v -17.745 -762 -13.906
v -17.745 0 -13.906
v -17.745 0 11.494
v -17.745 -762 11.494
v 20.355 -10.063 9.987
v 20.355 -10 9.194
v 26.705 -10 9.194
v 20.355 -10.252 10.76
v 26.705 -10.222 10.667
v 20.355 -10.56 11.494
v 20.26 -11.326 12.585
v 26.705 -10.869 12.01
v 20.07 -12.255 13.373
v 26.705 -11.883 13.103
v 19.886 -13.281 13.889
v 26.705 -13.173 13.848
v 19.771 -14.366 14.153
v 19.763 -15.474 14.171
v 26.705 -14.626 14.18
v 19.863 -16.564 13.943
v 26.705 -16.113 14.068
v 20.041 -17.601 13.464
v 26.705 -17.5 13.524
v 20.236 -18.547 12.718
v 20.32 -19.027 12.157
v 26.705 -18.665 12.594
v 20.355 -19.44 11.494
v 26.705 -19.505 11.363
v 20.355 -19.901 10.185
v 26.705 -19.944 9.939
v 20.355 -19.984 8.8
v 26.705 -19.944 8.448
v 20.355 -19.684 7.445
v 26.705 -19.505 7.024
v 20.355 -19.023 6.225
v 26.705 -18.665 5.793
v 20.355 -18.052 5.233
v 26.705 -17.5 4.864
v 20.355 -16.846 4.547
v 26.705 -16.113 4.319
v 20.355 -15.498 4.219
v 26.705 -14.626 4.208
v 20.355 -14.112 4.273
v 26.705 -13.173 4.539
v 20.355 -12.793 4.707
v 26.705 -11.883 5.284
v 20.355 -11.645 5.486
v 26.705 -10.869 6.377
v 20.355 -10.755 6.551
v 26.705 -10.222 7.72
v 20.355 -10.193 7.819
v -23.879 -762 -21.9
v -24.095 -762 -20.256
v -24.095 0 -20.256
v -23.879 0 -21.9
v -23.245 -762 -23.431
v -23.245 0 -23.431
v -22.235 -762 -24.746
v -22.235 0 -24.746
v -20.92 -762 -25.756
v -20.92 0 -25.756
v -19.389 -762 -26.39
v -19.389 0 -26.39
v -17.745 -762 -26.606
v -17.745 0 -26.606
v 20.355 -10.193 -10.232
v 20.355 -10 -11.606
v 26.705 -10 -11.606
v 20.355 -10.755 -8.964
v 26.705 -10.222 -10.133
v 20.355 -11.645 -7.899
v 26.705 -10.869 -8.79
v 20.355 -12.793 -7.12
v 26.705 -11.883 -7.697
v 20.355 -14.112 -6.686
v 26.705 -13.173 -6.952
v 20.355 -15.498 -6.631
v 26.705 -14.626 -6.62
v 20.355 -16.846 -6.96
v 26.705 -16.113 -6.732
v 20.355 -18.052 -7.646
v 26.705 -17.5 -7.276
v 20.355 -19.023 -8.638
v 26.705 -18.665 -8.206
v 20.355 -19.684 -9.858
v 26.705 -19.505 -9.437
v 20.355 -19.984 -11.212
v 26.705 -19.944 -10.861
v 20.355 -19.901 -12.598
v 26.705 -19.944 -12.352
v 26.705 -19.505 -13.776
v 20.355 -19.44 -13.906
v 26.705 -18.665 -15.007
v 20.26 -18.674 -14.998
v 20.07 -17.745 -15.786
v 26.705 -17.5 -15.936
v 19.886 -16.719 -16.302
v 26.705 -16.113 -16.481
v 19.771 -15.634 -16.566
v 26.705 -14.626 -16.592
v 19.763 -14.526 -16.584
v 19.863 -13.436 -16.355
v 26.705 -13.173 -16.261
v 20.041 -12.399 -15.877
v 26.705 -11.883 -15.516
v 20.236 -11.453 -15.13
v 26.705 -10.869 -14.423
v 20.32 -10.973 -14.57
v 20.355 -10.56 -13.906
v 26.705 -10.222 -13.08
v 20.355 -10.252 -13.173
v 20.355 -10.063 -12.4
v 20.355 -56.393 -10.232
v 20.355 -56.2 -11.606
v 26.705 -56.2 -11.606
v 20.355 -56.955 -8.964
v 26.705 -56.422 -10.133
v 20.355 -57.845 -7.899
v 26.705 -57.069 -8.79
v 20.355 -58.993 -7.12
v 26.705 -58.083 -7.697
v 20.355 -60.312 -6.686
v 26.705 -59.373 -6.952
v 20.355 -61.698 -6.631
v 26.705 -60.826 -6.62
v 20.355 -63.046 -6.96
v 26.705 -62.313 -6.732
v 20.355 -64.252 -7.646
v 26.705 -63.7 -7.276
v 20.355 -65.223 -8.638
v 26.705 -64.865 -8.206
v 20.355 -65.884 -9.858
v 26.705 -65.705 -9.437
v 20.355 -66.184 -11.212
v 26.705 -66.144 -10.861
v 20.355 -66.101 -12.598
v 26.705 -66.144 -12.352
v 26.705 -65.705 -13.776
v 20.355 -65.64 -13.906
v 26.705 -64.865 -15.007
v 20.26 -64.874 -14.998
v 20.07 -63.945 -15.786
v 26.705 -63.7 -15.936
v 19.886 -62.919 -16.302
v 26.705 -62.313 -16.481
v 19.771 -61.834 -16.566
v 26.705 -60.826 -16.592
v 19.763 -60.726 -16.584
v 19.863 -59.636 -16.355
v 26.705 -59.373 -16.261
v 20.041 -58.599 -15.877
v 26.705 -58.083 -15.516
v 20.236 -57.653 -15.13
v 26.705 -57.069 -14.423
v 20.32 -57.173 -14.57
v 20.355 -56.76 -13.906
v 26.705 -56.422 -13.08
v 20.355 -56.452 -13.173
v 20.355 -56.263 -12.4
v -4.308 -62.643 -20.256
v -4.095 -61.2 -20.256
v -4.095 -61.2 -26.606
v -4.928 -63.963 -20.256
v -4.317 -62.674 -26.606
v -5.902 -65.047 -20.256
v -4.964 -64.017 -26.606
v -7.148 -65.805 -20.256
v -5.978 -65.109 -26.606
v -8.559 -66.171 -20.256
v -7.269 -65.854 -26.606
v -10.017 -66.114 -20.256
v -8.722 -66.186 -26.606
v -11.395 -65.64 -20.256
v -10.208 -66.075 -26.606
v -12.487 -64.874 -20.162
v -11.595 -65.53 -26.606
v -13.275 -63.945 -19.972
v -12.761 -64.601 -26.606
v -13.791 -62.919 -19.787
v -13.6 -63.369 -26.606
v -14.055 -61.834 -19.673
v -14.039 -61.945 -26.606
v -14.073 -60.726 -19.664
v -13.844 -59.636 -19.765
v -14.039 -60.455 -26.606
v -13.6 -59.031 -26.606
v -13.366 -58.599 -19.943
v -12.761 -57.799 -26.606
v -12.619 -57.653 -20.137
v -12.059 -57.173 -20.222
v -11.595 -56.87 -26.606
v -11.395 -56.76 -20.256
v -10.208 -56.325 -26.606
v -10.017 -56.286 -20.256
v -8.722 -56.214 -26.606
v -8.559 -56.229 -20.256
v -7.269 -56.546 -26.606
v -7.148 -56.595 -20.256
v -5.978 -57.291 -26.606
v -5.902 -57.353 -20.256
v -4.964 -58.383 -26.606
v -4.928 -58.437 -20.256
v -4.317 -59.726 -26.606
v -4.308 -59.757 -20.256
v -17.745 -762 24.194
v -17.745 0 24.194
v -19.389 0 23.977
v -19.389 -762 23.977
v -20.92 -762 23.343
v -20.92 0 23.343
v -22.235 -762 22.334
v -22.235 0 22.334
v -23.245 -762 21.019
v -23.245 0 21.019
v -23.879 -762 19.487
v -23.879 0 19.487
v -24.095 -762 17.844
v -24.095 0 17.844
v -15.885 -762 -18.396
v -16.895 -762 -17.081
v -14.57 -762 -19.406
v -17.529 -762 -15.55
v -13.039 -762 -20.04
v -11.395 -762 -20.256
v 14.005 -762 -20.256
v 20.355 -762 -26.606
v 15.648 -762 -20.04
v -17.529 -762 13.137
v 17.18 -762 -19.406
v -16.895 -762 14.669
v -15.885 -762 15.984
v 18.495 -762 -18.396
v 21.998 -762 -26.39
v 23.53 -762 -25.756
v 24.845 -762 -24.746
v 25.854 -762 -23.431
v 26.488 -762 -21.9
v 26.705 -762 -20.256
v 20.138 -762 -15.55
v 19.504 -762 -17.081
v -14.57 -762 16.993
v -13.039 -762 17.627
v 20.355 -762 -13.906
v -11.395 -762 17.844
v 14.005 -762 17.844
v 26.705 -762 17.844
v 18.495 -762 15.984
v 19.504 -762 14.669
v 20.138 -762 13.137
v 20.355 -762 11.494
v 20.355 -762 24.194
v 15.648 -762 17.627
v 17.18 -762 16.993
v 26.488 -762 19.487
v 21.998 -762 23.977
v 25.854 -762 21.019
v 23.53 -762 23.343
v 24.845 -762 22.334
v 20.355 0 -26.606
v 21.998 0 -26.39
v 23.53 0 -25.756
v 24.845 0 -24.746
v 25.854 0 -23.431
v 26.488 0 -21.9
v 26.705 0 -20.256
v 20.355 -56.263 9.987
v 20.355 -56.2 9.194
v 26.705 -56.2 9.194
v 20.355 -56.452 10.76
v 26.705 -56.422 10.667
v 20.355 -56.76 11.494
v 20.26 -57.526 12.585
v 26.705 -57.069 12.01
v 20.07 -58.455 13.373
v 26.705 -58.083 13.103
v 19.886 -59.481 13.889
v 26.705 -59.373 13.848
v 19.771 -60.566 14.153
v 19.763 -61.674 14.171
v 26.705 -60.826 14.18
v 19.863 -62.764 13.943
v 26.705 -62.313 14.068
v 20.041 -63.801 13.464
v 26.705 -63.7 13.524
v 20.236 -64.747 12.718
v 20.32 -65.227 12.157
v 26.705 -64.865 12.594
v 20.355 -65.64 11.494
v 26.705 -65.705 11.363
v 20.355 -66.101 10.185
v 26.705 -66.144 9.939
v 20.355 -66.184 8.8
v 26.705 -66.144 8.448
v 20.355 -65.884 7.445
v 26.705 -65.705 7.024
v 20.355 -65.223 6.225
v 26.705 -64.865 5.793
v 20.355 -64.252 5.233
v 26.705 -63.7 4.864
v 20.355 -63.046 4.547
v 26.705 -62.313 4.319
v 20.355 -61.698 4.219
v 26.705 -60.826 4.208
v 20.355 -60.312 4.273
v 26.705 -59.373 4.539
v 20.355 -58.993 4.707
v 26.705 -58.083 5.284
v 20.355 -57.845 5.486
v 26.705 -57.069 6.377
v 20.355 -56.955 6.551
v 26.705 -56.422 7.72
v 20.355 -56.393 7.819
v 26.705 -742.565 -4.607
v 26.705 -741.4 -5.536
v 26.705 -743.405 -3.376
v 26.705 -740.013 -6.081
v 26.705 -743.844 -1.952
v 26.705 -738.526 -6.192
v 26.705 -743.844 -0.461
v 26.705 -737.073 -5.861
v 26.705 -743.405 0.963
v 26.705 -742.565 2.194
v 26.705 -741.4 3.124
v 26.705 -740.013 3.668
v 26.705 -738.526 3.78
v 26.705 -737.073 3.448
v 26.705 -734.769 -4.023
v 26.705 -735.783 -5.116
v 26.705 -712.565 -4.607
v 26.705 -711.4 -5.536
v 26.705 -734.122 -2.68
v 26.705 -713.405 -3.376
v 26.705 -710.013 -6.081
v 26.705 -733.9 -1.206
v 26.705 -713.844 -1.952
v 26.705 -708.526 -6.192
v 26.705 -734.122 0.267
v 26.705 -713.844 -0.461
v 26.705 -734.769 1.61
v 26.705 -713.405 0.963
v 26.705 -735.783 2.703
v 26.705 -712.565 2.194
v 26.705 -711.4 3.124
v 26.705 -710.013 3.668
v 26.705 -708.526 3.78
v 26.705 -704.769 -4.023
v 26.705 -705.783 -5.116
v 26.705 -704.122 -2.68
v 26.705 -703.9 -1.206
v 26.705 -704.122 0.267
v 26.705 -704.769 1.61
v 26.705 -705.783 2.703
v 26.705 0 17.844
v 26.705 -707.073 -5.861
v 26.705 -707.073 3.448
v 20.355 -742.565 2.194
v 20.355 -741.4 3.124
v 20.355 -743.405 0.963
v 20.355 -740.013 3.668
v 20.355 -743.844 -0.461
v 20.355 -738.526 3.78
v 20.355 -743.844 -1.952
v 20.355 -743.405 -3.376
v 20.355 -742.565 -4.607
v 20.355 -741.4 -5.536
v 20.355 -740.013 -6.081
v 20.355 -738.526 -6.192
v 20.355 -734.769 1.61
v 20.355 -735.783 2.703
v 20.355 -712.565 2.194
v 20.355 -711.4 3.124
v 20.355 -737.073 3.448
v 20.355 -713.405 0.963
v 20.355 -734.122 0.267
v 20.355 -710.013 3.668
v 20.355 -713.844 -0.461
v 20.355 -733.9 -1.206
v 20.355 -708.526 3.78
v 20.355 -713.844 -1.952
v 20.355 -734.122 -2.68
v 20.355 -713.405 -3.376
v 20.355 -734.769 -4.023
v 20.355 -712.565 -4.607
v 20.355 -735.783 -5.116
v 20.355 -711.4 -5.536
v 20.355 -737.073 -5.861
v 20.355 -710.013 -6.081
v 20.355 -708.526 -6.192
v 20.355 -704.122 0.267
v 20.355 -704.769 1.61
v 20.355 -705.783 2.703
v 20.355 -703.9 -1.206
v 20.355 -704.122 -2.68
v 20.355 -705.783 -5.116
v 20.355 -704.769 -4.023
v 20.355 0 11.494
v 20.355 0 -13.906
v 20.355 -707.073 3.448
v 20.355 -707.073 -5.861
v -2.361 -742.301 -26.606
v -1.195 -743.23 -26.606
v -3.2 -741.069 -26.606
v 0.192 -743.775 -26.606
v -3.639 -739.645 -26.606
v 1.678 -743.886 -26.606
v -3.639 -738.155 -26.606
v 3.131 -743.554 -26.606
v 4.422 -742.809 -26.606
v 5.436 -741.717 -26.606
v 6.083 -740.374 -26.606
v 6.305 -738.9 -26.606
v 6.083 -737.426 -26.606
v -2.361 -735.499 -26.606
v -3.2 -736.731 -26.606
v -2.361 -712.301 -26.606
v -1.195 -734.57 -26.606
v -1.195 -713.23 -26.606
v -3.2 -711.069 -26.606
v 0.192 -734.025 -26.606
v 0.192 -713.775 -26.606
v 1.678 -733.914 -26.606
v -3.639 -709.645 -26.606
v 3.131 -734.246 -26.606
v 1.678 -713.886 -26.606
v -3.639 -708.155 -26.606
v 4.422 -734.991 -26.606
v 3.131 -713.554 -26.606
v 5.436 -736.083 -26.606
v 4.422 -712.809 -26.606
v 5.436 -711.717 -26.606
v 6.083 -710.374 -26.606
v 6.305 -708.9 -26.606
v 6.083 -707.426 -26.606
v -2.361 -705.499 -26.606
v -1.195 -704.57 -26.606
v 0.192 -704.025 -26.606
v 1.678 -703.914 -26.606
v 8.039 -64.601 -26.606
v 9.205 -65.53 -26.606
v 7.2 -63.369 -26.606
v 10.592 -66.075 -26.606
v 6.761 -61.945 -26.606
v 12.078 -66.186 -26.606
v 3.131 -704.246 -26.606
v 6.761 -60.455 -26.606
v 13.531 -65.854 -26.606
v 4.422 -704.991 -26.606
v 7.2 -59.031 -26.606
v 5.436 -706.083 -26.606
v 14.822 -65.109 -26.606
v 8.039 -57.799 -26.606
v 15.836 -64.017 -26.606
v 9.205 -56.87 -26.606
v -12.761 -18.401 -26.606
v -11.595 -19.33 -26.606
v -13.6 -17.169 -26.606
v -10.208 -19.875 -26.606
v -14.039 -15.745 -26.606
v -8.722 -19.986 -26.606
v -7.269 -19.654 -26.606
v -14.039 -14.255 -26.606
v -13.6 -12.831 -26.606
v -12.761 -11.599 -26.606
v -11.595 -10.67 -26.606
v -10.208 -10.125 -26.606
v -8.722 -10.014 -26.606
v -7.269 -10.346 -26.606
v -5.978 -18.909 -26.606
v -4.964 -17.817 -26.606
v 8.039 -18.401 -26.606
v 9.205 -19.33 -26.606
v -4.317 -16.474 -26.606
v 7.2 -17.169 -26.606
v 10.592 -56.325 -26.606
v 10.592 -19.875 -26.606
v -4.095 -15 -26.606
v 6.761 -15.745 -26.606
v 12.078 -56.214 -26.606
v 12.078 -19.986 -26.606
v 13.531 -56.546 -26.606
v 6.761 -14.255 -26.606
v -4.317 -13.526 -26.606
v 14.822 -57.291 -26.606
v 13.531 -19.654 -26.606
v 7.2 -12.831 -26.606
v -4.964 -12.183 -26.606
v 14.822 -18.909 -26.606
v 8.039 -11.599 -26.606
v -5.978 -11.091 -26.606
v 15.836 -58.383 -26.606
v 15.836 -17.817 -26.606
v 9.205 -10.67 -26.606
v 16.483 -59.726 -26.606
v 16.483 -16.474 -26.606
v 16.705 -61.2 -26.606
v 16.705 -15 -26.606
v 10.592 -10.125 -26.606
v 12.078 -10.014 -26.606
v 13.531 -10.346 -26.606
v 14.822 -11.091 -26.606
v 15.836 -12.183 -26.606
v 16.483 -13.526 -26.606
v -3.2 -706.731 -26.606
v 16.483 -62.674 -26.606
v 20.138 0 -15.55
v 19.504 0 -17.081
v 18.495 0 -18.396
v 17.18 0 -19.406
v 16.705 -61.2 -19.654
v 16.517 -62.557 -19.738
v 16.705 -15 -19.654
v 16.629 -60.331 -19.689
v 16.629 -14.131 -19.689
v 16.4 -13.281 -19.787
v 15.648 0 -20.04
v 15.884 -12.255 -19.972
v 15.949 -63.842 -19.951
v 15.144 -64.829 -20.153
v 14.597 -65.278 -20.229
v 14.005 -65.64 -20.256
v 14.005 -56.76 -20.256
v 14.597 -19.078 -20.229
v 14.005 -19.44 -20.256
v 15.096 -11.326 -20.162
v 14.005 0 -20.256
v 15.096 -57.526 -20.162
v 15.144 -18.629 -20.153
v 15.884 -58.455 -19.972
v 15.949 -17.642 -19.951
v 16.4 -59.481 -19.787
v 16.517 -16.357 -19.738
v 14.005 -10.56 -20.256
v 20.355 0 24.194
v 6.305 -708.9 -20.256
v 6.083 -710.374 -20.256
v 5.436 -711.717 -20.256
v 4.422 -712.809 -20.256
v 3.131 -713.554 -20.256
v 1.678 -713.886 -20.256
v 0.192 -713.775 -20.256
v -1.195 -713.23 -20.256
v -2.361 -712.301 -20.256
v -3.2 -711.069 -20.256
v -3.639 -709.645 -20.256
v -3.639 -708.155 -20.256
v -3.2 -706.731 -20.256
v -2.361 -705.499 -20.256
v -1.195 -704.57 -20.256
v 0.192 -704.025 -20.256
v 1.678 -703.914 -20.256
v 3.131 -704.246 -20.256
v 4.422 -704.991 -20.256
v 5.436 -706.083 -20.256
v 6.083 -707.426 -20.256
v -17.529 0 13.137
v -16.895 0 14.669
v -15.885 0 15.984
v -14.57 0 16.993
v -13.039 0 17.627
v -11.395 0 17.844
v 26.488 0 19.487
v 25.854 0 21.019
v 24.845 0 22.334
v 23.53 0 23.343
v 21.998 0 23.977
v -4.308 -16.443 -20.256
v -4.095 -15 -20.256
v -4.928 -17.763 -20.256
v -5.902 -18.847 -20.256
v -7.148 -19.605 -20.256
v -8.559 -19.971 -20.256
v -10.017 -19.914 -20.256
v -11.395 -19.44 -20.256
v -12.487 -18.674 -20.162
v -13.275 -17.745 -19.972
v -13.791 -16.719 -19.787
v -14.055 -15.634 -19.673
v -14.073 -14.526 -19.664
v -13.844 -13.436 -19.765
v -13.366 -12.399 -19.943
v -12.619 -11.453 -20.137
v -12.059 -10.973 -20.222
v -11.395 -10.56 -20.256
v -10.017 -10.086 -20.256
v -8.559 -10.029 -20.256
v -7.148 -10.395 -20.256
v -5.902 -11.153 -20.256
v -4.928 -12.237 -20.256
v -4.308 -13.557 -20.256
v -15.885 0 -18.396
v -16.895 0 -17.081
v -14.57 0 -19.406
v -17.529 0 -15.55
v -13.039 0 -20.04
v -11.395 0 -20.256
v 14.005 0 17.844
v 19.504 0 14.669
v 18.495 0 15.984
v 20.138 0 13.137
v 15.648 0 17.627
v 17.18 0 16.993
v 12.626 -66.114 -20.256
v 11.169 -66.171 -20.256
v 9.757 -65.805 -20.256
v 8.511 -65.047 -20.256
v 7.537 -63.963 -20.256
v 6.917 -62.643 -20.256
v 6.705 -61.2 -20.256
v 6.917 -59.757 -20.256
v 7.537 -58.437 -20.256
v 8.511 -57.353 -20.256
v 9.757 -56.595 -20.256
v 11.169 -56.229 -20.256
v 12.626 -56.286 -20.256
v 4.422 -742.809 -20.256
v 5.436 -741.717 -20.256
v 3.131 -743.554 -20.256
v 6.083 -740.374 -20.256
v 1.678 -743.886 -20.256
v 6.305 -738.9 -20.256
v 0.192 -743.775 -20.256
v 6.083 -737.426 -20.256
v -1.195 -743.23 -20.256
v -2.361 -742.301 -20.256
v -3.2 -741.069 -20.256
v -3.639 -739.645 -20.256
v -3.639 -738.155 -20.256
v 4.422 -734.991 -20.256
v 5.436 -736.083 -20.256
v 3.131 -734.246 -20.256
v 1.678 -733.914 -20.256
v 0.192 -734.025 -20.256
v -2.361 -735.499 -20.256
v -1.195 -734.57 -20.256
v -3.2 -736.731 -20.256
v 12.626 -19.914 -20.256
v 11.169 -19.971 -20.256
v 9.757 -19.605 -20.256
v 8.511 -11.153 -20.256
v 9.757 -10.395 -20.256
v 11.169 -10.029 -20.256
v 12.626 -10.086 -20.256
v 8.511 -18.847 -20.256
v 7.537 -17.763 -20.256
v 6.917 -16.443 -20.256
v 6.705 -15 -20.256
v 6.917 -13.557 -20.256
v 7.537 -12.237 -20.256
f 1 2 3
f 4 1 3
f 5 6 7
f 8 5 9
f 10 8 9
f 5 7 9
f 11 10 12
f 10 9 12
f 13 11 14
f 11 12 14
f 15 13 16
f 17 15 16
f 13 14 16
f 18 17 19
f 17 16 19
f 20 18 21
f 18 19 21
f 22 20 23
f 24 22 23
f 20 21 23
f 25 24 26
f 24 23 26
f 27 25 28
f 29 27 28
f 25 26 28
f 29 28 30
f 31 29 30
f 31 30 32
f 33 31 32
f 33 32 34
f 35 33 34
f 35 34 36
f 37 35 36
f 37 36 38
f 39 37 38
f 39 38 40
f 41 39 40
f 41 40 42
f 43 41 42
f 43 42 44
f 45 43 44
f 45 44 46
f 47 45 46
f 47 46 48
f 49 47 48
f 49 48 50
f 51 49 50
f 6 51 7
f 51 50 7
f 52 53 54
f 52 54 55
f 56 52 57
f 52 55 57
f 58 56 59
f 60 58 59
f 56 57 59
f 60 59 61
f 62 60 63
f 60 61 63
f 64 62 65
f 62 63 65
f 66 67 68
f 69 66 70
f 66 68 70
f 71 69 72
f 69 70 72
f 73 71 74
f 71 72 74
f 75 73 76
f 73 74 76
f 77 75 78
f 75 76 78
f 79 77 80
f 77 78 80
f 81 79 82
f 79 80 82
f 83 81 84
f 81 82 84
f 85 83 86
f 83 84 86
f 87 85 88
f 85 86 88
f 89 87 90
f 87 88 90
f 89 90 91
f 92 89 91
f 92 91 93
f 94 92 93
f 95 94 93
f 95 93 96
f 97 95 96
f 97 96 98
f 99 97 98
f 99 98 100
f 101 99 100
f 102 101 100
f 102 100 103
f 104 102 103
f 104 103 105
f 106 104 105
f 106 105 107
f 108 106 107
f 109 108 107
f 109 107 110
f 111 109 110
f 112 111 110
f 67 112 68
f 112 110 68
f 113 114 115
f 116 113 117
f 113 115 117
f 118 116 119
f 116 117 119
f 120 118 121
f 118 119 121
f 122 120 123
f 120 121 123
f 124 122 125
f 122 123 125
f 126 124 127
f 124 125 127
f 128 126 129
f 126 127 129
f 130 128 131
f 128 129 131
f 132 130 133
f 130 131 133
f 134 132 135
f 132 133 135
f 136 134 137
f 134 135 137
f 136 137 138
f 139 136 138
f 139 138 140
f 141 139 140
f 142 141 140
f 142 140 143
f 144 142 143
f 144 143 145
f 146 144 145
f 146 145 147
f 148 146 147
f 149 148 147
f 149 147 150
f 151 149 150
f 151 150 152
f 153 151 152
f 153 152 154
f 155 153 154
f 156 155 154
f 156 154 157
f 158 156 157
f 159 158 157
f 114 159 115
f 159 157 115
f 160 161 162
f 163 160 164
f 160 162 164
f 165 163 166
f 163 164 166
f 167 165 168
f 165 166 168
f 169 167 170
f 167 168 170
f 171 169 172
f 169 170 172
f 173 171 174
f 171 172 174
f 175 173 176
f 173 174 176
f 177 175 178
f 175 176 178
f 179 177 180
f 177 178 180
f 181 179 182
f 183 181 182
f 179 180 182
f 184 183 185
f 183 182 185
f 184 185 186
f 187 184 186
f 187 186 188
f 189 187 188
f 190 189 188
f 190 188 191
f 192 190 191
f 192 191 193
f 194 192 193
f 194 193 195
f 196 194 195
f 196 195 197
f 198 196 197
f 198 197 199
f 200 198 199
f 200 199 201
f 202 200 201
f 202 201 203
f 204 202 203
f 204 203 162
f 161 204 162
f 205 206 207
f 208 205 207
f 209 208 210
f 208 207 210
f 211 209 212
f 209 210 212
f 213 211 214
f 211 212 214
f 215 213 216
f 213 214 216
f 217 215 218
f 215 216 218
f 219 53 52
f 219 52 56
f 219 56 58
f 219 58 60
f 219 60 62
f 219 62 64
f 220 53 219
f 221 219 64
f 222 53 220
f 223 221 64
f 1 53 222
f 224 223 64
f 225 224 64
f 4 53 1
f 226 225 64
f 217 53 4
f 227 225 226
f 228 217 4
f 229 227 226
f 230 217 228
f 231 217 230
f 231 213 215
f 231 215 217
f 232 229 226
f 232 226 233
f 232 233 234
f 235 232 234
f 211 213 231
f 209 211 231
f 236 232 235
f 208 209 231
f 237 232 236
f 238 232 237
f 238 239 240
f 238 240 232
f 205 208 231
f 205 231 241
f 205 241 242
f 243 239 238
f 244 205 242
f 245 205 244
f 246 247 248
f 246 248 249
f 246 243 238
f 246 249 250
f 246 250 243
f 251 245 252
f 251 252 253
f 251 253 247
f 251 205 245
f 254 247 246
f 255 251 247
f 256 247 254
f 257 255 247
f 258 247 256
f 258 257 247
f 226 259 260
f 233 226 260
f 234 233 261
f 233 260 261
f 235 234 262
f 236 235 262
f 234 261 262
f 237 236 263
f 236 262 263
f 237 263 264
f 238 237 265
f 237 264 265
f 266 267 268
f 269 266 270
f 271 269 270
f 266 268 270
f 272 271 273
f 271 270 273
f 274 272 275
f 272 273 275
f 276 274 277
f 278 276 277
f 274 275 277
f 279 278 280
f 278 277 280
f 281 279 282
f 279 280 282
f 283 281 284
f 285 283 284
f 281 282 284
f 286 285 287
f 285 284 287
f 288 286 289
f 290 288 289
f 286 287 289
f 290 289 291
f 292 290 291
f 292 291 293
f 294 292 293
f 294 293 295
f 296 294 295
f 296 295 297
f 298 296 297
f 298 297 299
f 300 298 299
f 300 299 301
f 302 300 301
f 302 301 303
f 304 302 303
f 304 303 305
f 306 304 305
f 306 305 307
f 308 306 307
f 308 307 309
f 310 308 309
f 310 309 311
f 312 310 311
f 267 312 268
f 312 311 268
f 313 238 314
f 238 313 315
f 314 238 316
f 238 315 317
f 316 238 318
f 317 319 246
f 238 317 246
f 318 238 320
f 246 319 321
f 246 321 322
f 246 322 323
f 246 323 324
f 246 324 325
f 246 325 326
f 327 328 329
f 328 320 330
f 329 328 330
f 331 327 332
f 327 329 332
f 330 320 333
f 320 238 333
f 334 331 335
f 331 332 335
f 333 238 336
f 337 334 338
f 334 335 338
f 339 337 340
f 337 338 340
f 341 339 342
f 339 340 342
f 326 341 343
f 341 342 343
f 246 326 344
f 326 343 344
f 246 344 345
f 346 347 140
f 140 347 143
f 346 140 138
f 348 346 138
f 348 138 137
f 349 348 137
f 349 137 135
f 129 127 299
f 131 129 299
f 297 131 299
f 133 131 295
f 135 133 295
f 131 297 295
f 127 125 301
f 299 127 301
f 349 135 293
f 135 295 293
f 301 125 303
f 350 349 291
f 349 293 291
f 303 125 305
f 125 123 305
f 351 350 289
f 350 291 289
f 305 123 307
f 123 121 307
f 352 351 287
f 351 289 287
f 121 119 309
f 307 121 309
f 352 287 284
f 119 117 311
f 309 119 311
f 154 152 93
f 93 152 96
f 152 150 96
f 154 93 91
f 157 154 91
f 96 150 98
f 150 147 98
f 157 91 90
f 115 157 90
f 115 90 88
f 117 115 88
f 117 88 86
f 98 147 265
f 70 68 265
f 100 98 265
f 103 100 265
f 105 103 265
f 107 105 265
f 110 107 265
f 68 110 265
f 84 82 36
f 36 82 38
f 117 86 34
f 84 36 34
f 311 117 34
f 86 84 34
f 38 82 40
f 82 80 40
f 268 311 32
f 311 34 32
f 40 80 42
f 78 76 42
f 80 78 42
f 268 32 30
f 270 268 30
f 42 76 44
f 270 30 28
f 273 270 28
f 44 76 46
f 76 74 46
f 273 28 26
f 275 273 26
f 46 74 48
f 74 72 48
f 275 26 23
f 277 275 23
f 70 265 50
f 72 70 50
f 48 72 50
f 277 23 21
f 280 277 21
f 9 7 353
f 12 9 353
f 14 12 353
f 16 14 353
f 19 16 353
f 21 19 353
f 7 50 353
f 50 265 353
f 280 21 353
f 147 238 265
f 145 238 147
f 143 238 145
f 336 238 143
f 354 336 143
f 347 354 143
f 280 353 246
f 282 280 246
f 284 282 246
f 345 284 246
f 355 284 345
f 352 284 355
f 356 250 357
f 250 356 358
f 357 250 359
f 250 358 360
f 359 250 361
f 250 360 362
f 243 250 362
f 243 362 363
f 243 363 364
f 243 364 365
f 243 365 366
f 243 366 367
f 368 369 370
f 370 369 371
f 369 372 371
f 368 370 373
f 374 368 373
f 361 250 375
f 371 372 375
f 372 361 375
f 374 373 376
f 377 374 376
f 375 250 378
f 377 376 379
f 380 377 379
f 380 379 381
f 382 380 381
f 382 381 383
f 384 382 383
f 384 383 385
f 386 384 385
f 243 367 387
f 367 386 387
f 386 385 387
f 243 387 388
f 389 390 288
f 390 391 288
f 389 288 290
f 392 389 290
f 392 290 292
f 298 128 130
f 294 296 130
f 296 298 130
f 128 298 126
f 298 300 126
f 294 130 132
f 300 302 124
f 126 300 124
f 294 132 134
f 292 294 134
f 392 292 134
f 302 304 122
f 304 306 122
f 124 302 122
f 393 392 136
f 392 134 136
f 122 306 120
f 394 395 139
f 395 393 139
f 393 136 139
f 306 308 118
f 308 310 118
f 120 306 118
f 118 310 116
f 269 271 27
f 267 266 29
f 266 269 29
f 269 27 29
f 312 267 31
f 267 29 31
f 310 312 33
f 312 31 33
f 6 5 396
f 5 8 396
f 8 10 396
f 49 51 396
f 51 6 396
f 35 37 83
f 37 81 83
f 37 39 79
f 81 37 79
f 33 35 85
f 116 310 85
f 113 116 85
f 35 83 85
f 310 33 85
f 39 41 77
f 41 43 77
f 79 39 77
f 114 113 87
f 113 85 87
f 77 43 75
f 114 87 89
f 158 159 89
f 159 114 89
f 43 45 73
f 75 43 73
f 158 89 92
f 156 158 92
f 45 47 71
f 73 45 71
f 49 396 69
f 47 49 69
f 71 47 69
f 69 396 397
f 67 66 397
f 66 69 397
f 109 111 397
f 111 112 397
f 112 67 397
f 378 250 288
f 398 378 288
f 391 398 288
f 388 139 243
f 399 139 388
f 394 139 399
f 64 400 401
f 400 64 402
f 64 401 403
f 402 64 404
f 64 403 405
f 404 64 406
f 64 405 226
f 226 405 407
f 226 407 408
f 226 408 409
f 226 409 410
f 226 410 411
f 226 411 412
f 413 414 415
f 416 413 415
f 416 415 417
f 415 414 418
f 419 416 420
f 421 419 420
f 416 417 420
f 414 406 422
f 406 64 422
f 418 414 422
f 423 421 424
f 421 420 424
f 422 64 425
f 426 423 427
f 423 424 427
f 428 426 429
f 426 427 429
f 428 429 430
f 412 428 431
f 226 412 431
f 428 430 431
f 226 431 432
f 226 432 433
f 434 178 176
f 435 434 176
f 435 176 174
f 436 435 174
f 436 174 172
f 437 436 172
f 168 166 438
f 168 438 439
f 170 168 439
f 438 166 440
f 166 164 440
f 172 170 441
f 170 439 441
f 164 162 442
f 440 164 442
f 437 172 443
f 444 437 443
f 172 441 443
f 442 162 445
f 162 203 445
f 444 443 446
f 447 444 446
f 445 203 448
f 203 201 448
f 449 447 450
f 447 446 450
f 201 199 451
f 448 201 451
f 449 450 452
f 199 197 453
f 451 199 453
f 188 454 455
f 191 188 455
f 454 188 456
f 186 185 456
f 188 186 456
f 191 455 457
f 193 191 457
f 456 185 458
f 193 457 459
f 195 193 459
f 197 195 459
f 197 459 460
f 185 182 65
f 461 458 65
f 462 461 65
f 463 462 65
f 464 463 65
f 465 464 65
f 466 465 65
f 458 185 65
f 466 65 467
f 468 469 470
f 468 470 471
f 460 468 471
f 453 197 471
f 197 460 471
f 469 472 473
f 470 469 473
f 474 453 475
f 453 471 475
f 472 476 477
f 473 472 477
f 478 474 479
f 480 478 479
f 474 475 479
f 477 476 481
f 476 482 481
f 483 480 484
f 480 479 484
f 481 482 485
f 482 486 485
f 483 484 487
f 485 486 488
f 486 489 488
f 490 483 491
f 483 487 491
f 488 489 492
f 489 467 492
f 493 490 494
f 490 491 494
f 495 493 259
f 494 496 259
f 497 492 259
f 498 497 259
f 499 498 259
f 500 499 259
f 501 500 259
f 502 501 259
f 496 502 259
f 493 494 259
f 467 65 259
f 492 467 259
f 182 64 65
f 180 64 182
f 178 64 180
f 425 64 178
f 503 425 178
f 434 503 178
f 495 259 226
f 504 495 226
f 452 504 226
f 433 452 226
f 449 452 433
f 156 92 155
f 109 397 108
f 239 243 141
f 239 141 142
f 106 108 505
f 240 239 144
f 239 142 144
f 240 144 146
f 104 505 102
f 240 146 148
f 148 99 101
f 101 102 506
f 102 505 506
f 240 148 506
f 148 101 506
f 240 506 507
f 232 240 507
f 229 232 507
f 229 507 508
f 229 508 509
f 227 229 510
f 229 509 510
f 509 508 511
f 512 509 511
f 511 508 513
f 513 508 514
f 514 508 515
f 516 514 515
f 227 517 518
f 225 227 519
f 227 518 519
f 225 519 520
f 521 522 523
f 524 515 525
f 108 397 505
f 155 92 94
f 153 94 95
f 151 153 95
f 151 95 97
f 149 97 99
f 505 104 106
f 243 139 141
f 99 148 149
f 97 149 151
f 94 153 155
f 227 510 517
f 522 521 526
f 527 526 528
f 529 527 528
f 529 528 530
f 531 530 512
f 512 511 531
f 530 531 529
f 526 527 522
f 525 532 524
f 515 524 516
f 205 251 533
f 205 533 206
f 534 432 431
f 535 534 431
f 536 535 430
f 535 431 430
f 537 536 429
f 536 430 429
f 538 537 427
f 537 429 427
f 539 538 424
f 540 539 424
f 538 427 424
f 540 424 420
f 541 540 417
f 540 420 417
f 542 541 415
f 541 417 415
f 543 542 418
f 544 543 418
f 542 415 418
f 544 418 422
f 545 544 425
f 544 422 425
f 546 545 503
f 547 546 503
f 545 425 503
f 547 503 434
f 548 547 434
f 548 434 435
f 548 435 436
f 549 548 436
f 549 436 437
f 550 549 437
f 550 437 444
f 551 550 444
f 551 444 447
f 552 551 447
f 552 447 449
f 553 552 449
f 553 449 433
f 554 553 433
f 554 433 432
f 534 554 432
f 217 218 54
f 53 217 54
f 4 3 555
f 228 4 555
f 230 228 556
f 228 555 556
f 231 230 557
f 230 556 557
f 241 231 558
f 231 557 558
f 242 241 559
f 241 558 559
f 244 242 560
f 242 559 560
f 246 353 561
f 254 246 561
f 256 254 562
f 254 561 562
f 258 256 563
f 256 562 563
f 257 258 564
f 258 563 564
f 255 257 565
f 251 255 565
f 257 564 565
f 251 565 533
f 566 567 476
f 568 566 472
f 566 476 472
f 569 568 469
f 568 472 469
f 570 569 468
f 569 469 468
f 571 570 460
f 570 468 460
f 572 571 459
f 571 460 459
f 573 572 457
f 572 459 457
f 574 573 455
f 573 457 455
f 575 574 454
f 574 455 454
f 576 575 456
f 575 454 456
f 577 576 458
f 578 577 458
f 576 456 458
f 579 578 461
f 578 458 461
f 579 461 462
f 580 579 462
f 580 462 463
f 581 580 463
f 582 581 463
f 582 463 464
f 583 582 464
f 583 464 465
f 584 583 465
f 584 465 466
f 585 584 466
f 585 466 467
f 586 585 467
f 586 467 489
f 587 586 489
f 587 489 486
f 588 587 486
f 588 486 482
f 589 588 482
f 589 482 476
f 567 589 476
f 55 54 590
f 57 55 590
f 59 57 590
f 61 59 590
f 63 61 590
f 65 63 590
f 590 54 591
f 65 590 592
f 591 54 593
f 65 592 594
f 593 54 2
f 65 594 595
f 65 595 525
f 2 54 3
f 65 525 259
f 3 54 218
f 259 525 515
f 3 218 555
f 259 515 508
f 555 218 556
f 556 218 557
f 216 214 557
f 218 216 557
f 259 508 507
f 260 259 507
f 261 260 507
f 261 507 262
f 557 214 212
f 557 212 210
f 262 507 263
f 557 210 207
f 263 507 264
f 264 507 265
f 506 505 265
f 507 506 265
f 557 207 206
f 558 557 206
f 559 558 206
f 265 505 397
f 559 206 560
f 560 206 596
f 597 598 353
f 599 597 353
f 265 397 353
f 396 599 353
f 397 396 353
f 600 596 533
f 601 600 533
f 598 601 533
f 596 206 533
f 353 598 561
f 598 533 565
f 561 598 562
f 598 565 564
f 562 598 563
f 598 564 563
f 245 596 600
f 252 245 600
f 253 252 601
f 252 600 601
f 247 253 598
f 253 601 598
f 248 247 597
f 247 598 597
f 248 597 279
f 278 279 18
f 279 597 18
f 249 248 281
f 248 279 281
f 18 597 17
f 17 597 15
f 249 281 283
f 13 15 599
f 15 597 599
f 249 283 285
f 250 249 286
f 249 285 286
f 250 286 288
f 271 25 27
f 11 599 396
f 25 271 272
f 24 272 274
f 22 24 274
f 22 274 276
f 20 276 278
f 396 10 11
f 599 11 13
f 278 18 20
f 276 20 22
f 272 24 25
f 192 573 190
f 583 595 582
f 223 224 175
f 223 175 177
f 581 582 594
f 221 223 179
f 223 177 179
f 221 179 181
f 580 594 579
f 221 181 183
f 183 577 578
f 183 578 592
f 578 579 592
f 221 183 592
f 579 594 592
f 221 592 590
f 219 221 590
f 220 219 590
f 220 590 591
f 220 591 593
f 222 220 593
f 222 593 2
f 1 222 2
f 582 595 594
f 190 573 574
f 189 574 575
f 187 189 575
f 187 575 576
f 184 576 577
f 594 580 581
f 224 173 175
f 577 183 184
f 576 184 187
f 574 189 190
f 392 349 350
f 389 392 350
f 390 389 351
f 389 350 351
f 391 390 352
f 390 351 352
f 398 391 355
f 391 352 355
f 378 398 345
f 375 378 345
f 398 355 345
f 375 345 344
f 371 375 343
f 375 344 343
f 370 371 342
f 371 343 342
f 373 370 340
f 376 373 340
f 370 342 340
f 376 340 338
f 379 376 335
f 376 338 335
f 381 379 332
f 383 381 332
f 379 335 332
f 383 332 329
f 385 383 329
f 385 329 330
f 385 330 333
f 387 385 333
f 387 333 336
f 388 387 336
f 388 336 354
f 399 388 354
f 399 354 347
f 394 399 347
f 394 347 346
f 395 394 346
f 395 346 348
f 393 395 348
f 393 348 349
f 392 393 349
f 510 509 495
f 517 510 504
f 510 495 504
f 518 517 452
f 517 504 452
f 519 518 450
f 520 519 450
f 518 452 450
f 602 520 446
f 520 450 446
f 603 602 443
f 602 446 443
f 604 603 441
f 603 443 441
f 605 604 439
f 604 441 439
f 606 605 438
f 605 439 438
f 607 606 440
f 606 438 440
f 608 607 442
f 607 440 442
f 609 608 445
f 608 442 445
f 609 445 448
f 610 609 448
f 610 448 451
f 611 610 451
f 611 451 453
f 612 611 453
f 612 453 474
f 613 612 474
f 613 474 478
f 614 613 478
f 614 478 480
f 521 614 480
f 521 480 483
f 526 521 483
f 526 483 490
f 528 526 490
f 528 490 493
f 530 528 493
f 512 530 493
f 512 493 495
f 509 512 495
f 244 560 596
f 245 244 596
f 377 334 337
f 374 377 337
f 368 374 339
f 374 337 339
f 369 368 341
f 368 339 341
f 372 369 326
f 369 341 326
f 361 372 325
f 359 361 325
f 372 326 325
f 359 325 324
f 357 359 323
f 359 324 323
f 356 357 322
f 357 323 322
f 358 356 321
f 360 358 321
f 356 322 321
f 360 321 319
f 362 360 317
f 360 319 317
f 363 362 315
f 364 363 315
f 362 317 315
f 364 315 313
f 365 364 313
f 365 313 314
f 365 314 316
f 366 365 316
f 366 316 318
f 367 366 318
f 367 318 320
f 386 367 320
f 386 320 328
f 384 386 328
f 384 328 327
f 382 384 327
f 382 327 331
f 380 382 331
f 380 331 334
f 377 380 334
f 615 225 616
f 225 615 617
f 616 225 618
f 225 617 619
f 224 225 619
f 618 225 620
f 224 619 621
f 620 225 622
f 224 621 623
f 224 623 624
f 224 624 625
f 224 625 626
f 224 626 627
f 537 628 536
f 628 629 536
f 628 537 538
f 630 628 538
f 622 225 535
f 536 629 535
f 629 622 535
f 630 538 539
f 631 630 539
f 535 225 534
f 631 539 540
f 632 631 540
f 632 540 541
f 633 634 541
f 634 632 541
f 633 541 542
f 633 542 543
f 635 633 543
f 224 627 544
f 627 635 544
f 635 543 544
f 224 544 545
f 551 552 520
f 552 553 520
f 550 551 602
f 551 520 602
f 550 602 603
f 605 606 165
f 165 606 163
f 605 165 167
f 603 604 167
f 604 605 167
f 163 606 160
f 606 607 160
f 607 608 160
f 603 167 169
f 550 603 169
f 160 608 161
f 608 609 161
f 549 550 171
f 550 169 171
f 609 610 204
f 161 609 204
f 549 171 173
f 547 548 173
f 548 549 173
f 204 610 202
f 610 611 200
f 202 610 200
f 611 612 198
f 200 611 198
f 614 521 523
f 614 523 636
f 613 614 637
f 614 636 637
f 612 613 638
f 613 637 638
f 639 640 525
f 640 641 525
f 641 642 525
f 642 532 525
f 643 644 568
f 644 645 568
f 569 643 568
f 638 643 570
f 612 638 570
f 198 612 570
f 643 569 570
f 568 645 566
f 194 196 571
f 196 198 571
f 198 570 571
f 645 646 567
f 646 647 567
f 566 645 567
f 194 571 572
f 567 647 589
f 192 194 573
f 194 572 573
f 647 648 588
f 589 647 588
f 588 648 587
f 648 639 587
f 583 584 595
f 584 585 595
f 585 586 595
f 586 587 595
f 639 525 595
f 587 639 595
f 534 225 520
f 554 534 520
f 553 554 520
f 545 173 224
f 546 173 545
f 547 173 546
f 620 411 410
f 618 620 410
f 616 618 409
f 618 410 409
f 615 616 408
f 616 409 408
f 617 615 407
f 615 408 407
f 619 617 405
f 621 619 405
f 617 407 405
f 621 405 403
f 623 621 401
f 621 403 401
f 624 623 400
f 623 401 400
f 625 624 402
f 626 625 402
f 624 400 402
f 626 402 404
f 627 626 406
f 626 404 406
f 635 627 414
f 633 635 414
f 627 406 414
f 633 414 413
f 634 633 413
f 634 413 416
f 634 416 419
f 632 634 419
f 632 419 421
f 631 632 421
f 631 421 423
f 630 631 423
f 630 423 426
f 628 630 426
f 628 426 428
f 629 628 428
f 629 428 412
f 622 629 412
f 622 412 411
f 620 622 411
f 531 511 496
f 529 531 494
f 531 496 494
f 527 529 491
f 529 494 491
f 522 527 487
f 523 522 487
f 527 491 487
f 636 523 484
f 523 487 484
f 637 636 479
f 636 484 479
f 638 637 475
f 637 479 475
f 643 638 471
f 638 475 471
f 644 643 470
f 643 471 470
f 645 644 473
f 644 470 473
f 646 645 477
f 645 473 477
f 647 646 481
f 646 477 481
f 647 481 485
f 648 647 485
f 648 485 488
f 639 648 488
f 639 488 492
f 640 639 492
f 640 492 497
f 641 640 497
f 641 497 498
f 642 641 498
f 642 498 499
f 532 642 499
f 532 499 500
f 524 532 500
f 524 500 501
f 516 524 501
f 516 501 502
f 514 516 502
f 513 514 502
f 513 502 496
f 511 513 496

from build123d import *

# Parameters (mm, degrees)
F1_DEPTH = 762
F2_R     = 5
F3_DEPTH = 25
F4_R     = 5
F5_DEPTH = 25
F6_R     = 5
F7_DEPTH = 25
F8_R     = 5
F9_DEPTH = 25


with BuildPart() as f1:
    # F0 (on Front) → F1 (new body)
    with BuildSketch(Plane.XZ):
        with BuildLine():
            Line((20.354675, 24.193632), (-17.745325, 24.193632))
            ThreePointArc((-17.745325, 24.193632), (-22.235453, 22.33376), (-24.095325, 17.843632))
            Line((-24.095325, 17.843632), (-24.095325, -20.256368))
            ThreePointArc((-24.095325, -20.256368), (-22.235453, -24.746497), (-17.745325, -26.606368))
            Line((-17.745325, -26.606368), (20.354675, -26.606368))
            ThreePointArc((20.354675, -26.606368), (24.844803, -24.746497), (26.704675, -20.256368))
            Line((26.704675, -20.256368), (26.704675, 17.843632))
            ThreePointArc((26.704675, 17.843632), (24.844803, 22.33376), (20.354675, 24.193632))
        make_face()
        with BuildLine():
            ThreePointArc((-17.745325, 11.493632), (-15.885453, 15.98376), (-11.395325, 17.843632))
            Line((-11.395325, 17.843632), (14.004675, 17.843632))
            ThreePointArc((14.004675, 17.843632), (18.494803, 15.98376), (20.354675, 11.493632))
            Line((20.354675, 11.493632), (20.354675, -13.906368))
            ThreePointArc((20.354675, -13.906368), (18.494803, -18.396497), (14.004675, -20.256368))
            Line((14.004675, -20.256368), (-11.395325, -20.256368))
            ThreePointArc((-11.395325, -20.256368), (-15.885453, -18.396497), (-17.745325, -13.906368))
            Line((-17.745325, -13.906368), (-17.745325, 11.493632))
        make_face(mode=Mode.SUBTRACT)
    extrude(amount=F1_DEPTH)

    # F2 (on face) → F3 (cut)
    with BuildSketch(Plane.YZ.offset(26.704675)):
        with Locations((-15, 9.193632)):
            Circle(F2_R)
        with Locations((-15, -11.606368)):
            Circle(F2_R)
        with Locations((-61.2, 9.193632)):
            Circle(F2_R)
        with Locations((-61.2, -11.606368)):
            Circle(F2_R)
    extrude(amount=-F3_DEPTH, mode=Mode.SUBTRACT)

    # F4 (on face) → F5 (cut)
    with BuildSketch(Plane(origin=(0, 0, -26.606368), x_dir=(1, 0, 0), z_dir=(0, 0, -1))):
        with Locations((11.704675, 15)):
            Circle(F4_R)
        with Locations((-9.095325, 15)):
            Circle(F4_R)
        with Locations((11.704675, 61.2)):
            Circle(F4_R)
        with Locations((-9.095325, 61.2)):
            Circle(F4_R)
    extrude(amount=-F5_DEPTH, mode=Mode.SUBTRACT)

    # F6 (on face) → F7 (cut)
    with BuildSketch(Plane(origin=(0, 0, -26.606368), x_dir=(1, 0, 0), z_dir=(0, 0, -1))):
        with Locations((1.304675, 738.9)):
            Circle(F6_R)
        with Locations((1.304675, 708.9)):
            Circle(F6_R)
    extrude(amount=-F7_DEPTH, mode=Mode.SUBTRACT)

    # F8 (on face) → F9 (cut)
    with BuildSketch(Plane.YZ.offset(26.704675)):
        with Locations((-738.9, -1.206368)):
            Circle(F8_R)
        with Locations((-708.9, -1.206368)):
            Circle(F8_R)
    extrude(amount=-F9_DEPTH, mode=Mode.SUBTRACT)


solid = f1.part
